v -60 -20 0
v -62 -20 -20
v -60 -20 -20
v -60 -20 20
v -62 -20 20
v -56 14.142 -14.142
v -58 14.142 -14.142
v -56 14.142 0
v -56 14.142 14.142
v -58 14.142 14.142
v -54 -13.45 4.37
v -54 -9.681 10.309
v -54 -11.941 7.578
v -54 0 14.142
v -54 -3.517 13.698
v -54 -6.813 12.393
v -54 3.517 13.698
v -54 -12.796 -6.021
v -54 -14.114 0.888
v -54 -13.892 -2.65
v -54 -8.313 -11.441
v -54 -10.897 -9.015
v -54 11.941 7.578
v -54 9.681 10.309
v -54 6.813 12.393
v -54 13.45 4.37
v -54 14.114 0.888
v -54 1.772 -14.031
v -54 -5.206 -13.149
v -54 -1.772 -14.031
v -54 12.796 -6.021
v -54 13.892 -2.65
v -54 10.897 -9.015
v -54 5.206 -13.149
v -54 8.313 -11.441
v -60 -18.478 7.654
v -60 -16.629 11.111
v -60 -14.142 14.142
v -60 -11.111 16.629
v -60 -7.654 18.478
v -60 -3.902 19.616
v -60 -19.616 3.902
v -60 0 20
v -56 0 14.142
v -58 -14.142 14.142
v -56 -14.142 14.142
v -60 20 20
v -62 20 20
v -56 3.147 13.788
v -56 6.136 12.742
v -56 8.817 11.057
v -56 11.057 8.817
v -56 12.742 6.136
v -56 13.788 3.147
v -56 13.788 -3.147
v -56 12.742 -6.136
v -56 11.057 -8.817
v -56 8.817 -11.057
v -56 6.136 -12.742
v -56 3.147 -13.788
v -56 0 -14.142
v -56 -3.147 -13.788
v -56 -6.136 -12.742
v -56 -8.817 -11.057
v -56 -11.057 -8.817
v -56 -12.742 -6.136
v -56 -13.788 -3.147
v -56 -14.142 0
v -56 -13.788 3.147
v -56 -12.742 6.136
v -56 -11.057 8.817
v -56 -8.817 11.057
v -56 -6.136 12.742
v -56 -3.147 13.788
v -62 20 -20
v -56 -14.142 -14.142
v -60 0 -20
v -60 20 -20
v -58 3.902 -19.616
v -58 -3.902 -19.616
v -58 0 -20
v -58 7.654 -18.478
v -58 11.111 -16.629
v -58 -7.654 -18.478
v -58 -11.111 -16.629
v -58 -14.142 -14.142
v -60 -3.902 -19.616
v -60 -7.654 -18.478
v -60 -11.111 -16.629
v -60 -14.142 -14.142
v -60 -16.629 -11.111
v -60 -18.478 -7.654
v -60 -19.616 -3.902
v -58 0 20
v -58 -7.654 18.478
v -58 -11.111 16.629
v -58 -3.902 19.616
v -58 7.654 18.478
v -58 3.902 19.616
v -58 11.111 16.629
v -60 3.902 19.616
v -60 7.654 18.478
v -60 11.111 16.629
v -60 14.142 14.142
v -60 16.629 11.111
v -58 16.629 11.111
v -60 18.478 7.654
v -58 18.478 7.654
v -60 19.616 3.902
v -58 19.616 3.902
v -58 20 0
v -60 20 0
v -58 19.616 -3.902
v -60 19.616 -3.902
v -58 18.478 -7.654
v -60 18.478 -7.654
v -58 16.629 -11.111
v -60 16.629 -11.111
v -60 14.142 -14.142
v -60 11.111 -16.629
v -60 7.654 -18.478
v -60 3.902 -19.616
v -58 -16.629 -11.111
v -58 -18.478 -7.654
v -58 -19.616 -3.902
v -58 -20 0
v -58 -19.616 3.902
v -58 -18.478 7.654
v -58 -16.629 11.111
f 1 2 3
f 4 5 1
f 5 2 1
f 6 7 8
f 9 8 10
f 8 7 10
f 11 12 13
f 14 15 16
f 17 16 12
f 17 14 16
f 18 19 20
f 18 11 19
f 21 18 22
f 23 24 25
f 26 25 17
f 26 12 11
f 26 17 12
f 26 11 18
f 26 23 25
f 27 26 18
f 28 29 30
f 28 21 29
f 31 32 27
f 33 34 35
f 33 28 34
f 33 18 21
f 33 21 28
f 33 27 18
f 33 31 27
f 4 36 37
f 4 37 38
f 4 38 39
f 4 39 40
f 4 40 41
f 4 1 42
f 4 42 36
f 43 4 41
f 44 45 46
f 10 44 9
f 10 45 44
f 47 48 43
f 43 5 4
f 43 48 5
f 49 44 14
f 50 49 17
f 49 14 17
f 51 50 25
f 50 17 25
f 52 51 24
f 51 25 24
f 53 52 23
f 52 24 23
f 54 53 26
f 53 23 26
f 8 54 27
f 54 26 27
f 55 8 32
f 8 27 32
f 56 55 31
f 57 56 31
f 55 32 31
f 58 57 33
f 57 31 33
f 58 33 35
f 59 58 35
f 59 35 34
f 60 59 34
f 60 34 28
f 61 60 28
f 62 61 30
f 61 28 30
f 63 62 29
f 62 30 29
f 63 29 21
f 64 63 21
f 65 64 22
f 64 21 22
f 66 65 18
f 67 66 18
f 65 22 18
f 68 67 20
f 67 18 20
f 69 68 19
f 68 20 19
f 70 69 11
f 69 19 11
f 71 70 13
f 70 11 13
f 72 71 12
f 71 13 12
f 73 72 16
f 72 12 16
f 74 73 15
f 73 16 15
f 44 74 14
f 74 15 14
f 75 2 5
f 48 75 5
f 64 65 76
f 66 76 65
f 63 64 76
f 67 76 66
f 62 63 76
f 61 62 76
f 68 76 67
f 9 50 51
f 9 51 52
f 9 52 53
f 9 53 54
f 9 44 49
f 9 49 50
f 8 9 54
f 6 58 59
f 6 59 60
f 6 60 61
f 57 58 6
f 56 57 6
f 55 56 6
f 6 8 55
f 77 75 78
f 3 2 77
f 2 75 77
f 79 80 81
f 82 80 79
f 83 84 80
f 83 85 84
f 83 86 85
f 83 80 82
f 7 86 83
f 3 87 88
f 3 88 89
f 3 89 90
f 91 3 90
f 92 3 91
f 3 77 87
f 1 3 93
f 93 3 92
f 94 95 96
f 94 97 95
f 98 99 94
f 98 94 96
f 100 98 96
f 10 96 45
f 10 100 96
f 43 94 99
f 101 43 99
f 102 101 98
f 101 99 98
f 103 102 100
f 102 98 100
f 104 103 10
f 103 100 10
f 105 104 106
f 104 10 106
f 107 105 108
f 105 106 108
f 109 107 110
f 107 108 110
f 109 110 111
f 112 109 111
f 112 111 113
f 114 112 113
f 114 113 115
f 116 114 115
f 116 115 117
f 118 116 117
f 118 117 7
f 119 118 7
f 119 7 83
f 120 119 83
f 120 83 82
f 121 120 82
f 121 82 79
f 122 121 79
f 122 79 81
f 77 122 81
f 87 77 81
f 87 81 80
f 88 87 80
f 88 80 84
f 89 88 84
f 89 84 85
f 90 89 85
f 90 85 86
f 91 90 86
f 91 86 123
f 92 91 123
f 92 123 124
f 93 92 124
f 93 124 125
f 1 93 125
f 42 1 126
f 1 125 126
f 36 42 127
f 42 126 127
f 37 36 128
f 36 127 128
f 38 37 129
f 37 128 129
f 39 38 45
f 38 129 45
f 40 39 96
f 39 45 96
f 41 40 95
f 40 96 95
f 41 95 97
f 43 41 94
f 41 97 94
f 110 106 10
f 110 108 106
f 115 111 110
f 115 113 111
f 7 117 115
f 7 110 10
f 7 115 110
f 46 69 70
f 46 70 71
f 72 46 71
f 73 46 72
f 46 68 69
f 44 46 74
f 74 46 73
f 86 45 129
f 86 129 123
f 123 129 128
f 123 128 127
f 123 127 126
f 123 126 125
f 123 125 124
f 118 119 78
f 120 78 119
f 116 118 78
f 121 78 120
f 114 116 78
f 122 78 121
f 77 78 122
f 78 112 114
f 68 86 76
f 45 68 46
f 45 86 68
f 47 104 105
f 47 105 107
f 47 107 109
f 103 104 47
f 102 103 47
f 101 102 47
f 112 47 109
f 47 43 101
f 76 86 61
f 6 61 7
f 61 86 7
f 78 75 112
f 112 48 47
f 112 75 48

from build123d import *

# Parameters (mm, degrees)
F0_W     = 2
F0_H     = 40
F1_DEPTH = 20
F2_W     = 2
F2_H     = 20
F5_W     = 28.284272
F5_H     = 28.284272
F6_DEPTH = 2
F7_W     = 2
F7_H     = 14.142136


with BuildPart() as f1:
    # F0 (on Front) → F1 (new body, symmetric)
    with BuildSketch(Plane.XZ):
        with Locations((-61, 0)):
            Rectangle(F0_W, F0_H)
    extrude(amount=F1_DEPTH, both=True)

    # F2 (on Front) → F3 (revolve)
    with BuildSketch(Plane.XZ):
        with Locations((-59, 10)):
            Rectangle(F2_W, F2_H)
    revolve(axis=Axis((-60, 0, 0), (-1, 0, 0)))

    # F5 (on offset) → F6 (join)
    with BuildSketch(Plane.YZ.offset(-58)):
        Rectangle(F5_W, F5_H)
    extrude(amount=F6_DEPTH)

    # F7 (on Front) → F8 (revolve)
    with BuildSketch(Plane.XZ):
        with Locations((-55, 7.071068)):
            Rectangle(F7_W, F7_H)
    revolve(axis=Axis((-55, 0, 0), (-1, 0, 0)))


solid = f1.part
